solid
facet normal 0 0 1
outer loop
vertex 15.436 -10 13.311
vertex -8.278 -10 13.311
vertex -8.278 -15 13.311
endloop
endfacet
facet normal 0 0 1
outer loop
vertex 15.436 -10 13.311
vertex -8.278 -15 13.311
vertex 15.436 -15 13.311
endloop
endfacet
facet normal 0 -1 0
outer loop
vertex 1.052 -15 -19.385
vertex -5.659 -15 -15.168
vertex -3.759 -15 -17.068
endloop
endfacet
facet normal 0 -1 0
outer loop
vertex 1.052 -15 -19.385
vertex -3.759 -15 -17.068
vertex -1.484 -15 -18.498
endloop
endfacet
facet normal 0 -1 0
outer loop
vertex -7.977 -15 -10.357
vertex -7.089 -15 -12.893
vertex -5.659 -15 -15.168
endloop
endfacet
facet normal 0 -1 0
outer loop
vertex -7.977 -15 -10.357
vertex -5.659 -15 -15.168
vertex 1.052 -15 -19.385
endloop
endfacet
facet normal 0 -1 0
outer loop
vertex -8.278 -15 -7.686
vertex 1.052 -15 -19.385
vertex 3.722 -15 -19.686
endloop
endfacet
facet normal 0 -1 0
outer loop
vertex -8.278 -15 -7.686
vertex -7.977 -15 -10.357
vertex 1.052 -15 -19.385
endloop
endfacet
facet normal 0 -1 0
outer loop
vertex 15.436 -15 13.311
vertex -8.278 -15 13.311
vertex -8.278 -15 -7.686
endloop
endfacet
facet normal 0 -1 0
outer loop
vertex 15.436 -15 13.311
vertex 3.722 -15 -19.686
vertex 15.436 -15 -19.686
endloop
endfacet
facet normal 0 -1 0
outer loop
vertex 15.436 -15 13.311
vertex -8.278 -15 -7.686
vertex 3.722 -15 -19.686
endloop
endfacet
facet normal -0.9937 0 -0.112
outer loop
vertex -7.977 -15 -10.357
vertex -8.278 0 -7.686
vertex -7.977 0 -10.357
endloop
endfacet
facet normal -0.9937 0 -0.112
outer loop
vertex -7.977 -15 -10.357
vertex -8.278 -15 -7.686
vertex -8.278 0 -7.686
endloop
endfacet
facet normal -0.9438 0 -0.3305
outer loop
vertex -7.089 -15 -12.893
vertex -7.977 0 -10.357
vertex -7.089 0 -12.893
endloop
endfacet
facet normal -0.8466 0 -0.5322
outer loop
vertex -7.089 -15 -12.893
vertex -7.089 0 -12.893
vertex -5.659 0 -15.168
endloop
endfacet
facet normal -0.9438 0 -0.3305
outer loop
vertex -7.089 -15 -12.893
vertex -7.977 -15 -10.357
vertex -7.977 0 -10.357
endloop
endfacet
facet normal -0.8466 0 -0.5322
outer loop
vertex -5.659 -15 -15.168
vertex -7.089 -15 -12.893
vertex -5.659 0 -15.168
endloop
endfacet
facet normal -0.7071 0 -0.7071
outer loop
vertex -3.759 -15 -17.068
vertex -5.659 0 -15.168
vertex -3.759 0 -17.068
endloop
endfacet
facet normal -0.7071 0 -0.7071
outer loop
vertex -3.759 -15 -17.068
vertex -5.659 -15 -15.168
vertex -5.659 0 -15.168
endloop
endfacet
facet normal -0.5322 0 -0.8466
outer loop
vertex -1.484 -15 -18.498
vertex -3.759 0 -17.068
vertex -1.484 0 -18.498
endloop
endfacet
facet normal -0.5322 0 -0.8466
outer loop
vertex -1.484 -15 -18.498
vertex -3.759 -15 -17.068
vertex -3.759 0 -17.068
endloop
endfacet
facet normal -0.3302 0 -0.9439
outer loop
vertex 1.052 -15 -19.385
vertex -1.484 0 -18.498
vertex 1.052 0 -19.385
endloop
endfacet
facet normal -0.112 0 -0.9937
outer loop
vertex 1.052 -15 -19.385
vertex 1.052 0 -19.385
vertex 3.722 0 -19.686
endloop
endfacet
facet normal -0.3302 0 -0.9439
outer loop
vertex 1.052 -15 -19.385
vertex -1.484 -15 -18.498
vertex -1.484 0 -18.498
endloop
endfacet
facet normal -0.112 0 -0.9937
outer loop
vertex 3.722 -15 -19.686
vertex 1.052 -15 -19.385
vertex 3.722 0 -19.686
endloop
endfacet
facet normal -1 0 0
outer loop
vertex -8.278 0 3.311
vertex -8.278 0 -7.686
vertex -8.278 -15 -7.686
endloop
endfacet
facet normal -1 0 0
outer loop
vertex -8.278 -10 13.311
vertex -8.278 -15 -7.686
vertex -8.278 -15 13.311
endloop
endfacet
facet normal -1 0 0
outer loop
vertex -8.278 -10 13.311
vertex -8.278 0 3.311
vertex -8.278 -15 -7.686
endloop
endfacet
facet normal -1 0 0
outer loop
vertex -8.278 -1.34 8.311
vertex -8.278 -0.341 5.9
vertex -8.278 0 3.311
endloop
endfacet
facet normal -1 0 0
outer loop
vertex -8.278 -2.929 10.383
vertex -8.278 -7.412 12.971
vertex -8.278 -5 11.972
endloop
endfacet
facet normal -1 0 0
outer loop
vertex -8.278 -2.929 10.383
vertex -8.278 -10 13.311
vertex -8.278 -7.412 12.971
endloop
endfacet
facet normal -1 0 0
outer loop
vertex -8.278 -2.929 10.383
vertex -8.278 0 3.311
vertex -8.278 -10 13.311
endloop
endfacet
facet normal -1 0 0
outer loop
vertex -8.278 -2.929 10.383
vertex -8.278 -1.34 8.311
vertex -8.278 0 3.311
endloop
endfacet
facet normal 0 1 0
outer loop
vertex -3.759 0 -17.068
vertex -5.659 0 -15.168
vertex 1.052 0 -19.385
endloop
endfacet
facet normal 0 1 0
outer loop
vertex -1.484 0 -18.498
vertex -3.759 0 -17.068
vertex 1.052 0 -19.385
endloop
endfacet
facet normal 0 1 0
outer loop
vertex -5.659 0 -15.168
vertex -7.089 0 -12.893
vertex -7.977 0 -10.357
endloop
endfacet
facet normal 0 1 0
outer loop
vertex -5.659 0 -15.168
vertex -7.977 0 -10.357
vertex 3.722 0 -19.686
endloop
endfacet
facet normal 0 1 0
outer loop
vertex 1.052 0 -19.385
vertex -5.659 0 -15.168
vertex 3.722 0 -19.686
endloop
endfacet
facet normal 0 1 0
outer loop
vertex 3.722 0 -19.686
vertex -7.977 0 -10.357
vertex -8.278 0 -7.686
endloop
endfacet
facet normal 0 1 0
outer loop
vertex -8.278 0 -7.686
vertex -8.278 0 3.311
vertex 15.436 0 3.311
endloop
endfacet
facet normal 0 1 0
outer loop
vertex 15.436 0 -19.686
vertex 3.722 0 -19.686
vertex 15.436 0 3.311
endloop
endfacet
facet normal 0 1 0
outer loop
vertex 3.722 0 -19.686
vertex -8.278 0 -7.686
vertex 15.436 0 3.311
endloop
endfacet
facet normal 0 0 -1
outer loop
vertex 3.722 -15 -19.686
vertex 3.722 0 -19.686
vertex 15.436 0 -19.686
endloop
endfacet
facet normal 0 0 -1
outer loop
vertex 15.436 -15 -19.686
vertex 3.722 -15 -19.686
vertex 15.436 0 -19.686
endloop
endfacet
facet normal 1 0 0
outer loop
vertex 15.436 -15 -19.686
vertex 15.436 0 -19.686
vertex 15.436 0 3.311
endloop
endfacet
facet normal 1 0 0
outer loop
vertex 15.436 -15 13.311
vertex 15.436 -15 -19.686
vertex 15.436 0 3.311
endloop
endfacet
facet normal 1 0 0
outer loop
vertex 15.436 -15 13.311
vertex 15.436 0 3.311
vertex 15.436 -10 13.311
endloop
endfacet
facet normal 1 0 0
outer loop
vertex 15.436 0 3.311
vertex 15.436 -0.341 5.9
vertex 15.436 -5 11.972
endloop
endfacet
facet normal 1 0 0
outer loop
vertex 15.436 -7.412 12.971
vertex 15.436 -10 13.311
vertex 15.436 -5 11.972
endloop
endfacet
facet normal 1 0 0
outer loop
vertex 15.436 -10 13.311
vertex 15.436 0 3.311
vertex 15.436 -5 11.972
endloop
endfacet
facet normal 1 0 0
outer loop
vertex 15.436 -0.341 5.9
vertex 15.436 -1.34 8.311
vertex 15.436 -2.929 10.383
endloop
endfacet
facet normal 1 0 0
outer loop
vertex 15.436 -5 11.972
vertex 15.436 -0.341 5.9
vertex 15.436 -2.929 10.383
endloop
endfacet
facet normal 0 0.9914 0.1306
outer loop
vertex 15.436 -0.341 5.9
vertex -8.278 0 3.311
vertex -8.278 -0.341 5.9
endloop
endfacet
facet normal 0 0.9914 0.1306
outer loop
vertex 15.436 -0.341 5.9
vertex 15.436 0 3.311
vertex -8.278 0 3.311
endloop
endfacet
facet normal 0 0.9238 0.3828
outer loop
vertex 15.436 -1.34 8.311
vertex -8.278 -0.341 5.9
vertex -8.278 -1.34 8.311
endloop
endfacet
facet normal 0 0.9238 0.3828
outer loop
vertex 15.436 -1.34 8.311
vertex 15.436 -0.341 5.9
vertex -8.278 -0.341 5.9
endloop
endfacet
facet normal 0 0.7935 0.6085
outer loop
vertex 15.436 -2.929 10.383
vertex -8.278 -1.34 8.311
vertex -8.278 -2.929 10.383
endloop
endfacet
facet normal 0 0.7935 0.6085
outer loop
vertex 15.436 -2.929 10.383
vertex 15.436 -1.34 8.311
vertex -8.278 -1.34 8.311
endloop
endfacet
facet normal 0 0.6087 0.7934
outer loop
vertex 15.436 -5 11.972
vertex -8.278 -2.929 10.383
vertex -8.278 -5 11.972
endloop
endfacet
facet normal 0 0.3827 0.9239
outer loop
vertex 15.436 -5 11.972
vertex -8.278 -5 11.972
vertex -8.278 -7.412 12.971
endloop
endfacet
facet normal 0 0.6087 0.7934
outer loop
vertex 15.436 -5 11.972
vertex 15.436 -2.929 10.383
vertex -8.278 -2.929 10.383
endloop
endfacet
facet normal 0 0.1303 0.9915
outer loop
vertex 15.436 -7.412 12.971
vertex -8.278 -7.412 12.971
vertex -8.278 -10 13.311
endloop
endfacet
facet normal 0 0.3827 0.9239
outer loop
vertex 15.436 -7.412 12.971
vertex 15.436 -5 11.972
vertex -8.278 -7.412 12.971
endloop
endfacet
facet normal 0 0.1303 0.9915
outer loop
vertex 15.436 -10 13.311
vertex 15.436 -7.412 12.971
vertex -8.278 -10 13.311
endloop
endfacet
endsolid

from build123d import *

# Parameters (mm, degrees)
SKETCH_W    = 23.713642
SKETCH_H    = 32.997763
PAD_DEPTH   = 15
FILLET_R    = 12
FILLET001_R = 10


with BuildPart() as part:
    # Sketch (on XZ_Plane of Origin) → Pad (new body)
    with BuildSketch(Plane.XZ):
        with Locations((3.5793, -3.187445)):
            Rectangle(SKETCH_W, SKETCH_H)
    extrude(amount=PAD_DEPTH)

    # Fillet
    fillet_edges = [part.edges().sort_by_distance(p)[0] for p in [
        (-8.277521, -7.5, -19.686327),
    ]]
    fillet(fillet_edges, radius=FILLET_R)

    # Fillet001
    fillet001_edges = [part.edges().sort_by_distance(p)[0] for p in [
        (3.5793, 0, 13.311436),
    ]]
    fillet(fillet001_edges, radius=FILLET001_R)


solid = part.part
